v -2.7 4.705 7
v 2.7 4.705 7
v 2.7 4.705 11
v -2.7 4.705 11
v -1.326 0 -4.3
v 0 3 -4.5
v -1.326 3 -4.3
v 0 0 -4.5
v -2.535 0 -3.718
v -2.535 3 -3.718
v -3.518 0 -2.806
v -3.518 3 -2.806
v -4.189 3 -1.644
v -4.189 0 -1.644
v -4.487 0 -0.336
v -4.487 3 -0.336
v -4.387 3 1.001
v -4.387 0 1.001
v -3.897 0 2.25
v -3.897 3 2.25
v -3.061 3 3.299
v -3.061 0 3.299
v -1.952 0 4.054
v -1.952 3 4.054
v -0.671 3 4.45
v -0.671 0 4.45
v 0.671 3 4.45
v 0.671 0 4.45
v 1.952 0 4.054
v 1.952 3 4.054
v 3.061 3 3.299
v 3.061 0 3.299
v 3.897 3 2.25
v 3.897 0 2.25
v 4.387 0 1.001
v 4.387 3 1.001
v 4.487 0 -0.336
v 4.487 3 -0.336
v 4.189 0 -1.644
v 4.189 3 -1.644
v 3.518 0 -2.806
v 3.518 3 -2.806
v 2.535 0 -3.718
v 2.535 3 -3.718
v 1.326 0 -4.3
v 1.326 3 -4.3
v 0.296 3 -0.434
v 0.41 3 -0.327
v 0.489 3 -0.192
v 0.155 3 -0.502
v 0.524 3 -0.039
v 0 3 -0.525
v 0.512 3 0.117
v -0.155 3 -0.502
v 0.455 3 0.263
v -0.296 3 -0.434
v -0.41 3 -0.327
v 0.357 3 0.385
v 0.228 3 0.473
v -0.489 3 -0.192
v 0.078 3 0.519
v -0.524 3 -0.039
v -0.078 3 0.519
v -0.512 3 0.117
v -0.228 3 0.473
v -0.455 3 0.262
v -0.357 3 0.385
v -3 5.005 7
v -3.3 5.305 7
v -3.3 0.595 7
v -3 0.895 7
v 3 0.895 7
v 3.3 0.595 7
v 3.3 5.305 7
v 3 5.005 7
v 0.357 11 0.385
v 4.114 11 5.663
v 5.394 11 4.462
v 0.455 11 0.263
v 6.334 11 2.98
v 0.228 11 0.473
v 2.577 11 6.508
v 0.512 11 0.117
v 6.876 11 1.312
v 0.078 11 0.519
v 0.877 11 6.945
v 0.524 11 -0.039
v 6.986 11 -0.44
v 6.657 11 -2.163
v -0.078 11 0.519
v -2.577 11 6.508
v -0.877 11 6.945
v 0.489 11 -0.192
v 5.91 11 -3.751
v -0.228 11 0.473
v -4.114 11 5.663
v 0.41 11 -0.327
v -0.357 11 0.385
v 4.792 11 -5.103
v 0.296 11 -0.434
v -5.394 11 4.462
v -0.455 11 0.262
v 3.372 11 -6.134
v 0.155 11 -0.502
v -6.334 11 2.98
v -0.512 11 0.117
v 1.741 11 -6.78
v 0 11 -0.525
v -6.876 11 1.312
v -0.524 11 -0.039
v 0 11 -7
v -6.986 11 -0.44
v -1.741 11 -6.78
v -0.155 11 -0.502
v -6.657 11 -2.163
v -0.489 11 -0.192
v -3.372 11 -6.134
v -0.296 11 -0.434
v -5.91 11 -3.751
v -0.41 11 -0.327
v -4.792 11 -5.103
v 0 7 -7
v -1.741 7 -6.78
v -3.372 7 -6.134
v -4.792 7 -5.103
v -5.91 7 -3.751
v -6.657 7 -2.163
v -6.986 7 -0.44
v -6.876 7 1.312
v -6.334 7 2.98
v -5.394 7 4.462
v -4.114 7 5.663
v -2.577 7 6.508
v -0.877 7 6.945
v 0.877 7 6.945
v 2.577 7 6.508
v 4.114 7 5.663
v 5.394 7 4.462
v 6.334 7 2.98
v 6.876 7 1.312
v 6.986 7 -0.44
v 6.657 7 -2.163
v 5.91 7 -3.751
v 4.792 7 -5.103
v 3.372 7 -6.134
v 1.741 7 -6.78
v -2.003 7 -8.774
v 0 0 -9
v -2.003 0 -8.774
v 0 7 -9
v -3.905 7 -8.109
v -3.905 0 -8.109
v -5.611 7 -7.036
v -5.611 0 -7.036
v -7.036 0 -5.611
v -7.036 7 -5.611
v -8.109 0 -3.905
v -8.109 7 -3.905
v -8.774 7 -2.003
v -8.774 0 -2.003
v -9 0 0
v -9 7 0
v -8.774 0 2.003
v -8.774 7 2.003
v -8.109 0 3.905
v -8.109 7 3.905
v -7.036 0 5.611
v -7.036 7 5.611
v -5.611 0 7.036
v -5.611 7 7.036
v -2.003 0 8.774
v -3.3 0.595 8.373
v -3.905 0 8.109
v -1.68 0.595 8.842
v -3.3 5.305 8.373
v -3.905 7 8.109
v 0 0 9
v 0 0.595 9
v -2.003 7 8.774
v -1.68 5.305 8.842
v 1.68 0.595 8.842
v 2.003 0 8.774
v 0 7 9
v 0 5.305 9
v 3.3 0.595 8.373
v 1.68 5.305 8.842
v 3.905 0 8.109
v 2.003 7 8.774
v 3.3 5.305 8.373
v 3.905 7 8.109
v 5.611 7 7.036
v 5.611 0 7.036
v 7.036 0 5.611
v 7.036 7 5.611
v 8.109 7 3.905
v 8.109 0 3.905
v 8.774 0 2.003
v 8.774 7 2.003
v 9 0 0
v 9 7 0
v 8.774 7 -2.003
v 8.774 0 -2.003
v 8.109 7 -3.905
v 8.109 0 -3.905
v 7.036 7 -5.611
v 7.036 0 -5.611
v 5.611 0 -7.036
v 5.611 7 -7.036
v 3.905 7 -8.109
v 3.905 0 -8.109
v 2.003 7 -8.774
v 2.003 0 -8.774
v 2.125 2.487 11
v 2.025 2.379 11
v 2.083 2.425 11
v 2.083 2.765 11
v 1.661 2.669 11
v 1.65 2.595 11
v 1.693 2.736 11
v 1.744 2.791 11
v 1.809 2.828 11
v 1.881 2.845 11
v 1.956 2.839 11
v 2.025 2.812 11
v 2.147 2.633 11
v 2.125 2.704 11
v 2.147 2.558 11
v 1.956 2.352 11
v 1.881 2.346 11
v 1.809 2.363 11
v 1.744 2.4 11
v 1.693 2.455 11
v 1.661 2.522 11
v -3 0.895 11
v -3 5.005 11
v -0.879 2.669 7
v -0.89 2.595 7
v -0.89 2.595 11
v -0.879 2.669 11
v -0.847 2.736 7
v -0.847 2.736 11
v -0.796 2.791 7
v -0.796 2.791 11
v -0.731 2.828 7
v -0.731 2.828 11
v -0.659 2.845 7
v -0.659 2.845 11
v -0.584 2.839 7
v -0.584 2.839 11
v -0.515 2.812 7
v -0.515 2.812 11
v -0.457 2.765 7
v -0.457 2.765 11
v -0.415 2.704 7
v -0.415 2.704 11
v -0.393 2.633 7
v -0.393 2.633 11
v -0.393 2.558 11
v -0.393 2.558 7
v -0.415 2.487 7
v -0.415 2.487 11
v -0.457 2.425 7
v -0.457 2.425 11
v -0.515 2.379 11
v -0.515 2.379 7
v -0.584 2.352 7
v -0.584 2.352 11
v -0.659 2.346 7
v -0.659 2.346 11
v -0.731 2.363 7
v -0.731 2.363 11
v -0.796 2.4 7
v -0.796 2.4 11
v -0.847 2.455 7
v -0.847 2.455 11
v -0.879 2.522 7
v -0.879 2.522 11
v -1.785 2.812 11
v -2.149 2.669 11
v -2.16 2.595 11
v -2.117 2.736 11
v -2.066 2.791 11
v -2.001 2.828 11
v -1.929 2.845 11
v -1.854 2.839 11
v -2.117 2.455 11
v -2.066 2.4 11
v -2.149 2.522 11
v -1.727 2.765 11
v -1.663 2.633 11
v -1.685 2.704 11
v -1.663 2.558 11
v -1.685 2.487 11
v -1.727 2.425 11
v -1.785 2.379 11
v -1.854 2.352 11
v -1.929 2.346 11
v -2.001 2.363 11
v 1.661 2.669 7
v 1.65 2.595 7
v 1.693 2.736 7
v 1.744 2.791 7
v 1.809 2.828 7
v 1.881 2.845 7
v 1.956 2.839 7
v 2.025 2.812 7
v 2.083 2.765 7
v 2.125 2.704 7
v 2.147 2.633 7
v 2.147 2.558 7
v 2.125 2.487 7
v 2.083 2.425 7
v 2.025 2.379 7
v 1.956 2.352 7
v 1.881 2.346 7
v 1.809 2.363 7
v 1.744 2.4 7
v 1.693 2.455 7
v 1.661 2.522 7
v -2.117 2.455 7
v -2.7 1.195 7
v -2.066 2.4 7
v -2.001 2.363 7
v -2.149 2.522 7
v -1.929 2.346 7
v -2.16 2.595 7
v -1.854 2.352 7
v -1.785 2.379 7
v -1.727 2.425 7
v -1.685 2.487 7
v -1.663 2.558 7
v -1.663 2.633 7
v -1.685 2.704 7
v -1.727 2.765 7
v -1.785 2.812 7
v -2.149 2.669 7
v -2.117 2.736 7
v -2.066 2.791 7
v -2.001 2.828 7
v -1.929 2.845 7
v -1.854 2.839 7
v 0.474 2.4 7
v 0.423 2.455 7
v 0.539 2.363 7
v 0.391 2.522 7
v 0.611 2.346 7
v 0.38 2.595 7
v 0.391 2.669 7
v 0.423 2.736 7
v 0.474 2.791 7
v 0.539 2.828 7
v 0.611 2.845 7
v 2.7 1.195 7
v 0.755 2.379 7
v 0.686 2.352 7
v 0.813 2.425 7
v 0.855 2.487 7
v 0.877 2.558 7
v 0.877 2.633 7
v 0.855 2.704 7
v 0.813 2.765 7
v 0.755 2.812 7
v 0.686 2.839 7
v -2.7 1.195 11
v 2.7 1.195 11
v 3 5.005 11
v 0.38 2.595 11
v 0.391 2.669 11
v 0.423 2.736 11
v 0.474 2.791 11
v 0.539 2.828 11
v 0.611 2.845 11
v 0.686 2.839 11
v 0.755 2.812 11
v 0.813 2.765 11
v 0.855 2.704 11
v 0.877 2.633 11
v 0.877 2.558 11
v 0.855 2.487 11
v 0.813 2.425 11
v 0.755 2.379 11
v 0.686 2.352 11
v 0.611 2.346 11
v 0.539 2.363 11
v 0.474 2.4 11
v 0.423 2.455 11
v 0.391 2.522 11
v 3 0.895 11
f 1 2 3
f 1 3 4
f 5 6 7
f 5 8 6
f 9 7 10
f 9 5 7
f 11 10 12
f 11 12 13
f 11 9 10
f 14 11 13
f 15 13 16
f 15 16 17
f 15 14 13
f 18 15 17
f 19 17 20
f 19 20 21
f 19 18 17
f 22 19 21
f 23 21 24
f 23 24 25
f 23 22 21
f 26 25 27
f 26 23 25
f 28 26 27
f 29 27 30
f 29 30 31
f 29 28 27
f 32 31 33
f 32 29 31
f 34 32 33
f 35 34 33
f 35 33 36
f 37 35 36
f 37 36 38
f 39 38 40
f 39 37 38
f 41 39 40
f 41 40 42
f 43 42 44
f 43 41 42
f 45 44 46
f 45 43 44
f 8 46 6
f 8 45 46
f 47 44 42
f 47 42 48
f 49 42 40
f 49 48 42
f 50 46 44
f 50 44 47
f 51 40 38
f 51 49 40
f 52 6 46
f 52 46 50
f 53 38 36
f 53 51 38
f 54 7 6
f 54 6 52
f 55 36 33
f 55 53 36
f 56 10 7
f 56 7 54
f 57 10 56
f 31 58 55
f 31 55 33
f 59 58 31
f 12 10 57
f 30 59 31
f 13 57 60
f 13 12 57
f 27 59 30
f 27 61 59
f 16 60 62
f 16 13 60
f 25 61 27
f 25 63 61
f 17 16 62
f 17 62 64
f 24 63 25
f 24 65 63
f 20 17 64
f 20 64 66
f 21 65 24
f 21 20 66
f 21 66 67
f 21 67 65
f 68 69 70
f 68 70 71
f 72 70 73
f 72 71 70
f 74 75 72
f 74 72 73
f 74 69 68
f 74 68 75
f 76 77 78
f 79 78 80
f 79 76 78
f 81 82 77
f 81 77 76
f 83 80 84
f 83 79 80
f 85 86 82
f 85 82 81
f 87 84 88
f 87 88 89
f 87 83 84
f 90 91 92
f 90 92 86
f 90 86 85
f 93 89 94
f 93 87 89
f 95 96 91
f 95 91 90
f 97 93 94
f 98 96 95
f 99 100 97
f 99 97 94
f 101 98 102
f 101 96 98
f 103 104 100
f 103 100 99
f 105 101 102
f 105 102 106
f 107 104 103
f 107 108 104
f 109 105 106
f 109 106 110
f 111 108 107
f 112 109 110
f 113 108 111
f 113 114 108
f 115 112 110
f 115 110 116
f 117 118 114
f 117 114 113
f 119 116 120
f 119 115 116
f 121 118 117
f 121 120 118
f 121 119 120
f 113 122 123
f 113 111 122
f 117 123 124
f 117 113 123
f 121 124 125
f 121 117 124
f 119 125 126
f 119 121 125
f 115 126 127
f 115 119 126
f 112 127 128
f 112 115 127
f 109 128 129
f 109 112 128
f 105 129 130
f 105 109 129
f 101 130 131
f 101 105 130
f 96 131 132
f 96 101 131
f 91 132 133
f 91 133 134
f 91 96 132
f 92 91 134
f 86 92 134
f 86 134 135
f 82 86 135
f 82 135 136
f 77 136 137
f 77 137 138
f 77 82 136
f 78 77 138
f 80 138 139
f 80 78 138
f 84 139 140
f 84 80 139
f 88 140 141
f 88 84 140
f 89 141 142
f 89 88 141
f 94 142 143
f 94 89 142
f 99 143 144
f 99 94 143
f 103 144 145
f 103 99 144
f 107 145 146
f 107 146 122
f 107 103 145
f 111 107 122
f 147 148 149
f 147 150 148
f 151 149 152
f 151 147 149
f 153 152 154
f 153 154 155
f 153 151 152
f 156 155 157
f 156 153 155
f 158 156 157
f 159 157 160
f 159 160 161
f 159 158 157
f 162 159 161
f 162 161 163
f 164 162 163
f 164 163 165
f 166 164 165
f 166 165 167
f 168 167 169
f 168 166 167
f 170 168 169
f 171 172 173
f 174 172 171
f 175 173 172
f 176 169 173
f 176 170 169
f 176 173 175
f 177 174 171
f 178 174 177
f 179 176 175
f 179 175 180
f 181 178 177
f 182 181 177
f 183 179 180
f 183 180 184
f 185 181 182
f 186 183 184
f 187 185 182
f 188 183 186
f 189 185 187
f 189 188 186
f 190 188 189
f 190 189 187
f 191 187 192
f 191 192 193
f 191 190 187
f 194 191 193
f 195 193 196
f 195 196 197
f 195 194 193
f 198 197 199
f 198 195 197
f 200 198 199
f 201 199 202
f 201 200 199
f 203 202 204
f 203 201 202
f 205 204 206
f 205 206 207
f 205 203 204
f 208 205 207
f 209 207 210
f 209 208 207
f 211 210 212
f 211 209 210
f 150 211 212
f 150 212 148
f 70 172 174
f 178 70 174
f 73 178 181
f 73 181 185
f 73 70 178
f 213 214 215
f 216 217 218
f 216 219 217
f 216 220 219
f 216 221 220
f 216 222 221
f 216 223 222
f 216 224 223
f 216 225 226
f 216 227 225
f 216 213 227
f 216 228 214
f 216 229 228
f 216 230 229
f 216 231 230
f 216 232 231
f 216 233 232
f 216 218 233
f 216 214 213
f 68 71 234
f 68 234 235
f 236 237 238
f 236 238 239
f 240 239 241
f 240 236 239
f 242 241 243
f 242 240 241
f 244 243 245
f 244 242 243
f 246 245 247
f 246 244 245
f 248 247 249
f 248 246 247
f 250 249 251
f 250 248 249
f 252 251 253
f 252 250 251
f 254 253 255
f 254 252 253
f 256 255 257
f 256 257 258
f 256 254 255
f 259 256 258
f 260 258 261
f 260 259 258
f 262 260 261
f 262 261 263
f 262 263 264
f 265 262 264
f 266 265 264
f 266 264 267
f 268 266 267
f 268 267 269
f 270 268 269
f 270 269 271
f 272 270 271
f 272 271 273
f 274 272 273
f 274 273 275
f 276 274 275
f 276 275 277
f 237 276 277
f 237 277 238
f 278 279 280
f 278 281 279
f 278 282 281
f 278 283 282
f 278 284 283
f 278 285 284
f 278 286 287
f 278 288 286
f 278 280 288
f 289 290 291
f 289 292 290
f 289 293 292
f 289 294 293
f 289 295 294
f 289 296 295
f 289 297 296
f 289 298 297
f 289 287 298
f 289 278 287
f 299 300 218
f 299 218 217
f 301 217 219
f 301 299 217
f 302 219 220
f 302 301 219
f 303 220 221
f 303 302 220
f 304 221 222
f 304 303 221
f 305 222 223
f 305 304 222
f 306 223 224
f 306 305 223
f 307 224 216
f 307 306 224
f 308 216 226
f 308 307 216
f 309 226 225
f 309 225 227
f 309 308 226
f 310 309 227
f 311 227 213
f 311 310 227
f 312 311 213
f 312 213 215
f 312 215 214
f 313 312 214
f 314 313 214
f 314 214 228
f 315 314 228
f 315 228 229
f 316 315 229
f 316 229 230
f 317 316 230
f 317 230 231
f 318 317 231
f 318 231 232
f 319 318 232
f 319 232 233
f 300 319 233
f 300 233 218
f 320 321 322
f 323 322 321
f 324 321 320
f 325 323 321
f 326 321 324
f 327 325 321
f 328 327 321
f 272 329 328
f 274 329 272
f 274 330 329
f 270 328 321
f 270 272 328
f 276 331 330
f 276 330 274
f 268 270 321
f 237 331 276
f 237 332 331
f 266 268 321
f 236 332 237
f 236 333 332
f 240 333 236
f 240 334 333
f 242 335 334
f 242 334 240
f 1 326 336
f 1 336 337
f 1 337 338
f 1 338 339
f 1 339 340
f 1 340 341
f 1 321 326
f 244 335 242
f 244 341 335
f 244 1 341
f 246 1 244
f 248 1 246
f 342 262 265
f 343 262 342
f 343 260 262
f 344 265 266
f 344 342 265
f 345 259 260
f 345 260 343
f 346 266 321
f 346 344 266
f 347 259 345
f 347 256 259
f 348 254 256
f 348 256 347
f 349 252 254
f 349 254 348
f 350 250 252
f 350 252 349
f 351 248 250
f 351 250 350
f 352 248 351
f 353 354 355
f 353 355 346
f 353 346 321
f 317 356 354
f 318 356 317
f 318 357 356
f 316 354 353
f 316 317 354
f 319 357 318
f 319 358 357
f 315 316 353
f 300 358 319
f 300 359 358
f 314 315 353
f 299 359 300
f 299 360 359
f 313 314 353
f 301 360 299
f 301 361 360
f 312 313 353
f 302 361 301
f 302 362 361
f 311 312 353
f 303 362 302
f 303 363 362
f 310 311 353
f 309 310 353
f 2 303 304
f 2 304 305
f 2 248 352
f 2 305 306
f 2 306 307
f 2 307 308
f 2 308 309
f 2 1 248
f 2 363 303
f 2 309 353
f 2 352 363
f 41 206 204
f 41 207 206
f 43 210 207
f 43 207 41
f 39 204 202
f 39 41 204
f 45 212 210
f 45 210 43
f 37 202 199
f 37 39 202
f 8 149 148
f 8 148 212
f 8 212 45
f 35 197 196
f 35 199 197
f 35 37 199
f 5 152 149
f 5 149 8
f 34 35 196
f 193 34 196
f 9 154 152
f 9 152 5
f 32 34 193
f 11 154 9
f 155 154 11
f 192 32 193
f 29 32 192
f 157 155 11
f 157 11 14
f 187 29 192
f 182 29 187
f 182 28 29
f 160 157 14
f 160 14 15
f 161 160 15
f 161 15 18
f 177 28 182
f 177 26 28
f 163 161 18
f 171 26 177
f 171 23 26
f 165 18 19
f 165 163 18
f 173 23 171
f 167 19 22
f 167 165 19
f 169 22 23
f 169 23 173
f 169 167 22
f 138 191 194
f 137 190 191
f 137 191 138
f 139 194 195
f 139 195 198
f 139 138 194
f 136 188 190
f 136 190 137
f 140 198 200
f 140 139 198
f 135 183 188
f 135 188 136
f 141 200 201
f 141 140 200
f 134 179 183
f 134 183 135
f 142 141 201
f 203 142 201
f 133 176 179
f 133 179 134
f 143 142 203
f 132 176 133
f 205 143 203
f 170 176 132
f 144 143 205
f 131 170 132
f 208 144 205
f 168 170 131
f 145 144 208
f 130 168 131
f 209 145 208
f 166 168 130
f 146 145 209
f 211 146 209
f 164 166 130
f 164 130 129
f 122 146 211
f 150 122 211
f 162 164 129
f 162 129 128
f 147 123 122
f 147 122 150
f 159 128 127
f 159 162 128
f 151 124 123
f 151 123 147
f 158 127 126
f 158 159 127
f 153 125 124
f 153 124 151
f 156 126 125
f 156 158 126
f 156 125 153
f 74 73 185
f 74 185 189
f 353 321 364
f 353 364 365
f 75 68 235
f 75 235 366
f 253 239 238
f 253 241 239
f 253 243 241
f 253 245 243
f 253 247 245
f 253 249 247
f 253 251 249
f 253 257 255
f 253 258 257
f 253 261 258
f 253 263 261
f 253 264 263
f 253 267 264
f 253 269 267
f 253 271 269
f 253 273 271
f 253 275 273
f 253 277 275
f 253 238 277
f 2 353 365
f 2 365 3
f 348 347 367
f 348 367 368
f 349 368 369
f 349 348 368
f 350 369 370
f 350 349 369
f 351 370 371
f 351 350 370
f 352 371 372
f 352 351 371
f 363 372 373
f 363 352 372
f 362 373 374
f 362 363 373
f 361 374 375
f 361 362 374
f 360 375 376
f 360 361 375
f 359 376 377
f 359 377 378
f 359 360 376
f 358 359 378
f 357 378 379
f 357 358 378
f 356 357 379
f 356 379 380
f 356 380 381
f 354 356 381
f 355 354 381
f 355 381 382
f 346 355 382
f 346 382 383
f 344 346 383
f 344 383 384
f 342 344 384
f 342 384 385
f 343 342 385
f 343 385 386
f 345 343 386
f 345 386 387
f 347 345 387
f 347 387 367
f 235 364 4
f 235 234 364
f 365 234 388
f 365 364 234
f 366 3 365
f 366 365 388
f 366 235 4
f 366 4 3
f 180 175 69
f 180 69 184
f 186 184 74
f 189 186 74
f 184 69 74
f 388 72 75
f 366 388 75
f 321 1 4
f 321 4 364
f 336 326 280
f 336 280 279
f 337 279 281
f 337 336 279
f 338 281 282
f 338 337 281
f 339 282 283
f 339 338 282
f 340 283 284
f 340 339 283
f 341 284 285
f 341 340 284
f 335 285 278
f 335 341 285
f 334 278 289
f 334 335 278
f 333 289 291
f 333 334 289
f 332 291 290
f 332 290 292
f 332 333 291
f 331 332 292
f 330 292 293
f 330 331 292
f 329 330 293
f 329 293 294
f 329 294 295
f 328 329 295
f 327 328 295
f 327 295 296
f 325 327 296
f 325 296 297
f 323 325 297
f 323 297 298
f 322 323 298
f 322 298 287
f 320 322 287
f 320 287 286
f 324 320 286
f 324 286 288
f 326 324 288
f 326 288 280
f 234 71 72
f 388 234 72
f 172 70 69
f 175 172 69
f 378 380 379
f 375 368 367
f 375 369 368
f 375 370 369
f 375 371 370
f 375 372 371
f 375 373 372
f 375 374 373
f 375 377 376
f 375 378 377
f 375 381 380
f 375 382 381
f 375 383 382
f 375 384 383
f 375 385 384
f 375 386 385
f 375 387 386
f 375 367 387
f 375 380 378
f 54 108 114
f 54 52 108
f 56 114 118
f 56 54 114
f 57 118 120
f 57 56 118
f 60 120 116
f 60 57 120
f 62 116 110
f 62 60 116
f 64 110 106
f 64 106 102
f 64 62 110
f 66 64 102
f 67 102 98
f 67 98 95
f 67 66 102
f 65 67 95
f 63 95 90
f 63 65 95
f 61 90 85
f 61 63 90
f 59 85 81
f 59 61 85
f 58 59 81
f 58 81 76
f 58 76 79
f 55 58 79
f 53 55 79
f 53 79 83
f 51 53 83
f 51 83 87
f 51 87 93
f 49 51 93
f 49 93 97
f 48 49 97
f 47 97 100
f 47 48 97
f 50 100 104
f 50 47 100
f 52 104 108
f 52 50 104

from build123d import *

# Parameters (mm, degrees)
BOSS_EXTRU_1_DEPTH           = 2
BOSS_EXTRU_1_DEPTH_BACK      = 0.528751
ESQUISSE2_W                  = 6
ESQUISSE2_H                  = 4.109563502
ENL_V_MAT_EXTRU_1_DEPTH      = 2
ENL_V_MAT_EXTRU_1_DEPTH_BACK = 2
ESQUISSE3_W                  = 6.6
ESQUISSE3_H                  = 4.709563502
ESQUISSE3_W_2                = 6
ESQUISSE3_H_2                = 4.109563502
ESQUISSE3_W_3                = 5.4
ESQUISSE3_H_3                = 3.509563502
ESQUISSE3_R                  = 0.25


with BuildPart() as part:
    # Esquisse1 → Révolution1 (revolve)
    with BuildSketch(Plane.XY):
        Polygon((-4.5, 0), (-9, 0), (-9, 7), (-7, 7), (-7, 11), (-0.525, 11), (-0.525, 3), (-4.5, 3), align=None)
    revolve(axis=Axis((0, 0, 0), (0, 1, 0)))

    # Esquisse2 → Boss.-Extru.1 (add, two sides: drawn at the far end of the back side and taken through both)
    with BuildSketch(Plane.XY.offset(9).offset(-BOSS_EXTRU_1_DEPTH_BACK)):
        with Locations((0, 2.950126619)):
            Rectangle(ESQUISSE2_W, ESQUISSE2_H)
    extrude(amount=BOSS_EXTRU_1_DEPTH + BOSS_EXTRU_1_DEPTH_BACK)

    # Esquisse3 → Enlèv. mat.-Extru.1 (cut, two sides: drawn at the far end of the back side and taken through both)
    # profile 1 of 2: a face of its own
    with BuildSketch(Plane.XY.offset(9).offset(-ENL_V_MAT_EXTRU_1_DEPTH_BACK)):
        with Locations((0, 2.950126619)):
            Rectangle(ESQUISSE3_W, ESQUISSE3_H)
        with Locations((0, 2.950126619)):
            Rectangle(ESQUISSE3_W_2, ESQUISSE3_H_2, mode=Mode.SUBTRACT)
    # profile 2 of 2: a face of its own
    with BuildSketch(Plane.XY.offset(9).offset(-ENL_V_MAT_EXTRU_1_DEPTH_BACK)):
        with Locations((0, 2.950126619)):
            Rectangle(ESQUISSE3_W_3, ESQUISSE3_H_3)
        with Locations((1.9, 2.595344868)):
            Circle(ESQUISSE3_R, mode=Mode.SUBTRACT)
        with Locations((0.629918036, 2.595344868)):
            Circle(ESQUISSE3_R, mode=Mode.SUBTRACT)
        with Locations((-0.640081964, 2.595344868)):
            Circle(ESQUISSE3_R, mode=Mode.SUBTRACT)
        with Locations((-1.910081964, 2.595344868)):
            Circle(ESQUISSE3_R, mode=Mode.SUBTRACT)
    extrude(amount=ENL_V_MAT_EXTRU_1_DEPTH + ENL_V_MAT_EXTRU_1_DEPTH_BACK, mode=Mode.SUBTRACT)


solid = part.part
